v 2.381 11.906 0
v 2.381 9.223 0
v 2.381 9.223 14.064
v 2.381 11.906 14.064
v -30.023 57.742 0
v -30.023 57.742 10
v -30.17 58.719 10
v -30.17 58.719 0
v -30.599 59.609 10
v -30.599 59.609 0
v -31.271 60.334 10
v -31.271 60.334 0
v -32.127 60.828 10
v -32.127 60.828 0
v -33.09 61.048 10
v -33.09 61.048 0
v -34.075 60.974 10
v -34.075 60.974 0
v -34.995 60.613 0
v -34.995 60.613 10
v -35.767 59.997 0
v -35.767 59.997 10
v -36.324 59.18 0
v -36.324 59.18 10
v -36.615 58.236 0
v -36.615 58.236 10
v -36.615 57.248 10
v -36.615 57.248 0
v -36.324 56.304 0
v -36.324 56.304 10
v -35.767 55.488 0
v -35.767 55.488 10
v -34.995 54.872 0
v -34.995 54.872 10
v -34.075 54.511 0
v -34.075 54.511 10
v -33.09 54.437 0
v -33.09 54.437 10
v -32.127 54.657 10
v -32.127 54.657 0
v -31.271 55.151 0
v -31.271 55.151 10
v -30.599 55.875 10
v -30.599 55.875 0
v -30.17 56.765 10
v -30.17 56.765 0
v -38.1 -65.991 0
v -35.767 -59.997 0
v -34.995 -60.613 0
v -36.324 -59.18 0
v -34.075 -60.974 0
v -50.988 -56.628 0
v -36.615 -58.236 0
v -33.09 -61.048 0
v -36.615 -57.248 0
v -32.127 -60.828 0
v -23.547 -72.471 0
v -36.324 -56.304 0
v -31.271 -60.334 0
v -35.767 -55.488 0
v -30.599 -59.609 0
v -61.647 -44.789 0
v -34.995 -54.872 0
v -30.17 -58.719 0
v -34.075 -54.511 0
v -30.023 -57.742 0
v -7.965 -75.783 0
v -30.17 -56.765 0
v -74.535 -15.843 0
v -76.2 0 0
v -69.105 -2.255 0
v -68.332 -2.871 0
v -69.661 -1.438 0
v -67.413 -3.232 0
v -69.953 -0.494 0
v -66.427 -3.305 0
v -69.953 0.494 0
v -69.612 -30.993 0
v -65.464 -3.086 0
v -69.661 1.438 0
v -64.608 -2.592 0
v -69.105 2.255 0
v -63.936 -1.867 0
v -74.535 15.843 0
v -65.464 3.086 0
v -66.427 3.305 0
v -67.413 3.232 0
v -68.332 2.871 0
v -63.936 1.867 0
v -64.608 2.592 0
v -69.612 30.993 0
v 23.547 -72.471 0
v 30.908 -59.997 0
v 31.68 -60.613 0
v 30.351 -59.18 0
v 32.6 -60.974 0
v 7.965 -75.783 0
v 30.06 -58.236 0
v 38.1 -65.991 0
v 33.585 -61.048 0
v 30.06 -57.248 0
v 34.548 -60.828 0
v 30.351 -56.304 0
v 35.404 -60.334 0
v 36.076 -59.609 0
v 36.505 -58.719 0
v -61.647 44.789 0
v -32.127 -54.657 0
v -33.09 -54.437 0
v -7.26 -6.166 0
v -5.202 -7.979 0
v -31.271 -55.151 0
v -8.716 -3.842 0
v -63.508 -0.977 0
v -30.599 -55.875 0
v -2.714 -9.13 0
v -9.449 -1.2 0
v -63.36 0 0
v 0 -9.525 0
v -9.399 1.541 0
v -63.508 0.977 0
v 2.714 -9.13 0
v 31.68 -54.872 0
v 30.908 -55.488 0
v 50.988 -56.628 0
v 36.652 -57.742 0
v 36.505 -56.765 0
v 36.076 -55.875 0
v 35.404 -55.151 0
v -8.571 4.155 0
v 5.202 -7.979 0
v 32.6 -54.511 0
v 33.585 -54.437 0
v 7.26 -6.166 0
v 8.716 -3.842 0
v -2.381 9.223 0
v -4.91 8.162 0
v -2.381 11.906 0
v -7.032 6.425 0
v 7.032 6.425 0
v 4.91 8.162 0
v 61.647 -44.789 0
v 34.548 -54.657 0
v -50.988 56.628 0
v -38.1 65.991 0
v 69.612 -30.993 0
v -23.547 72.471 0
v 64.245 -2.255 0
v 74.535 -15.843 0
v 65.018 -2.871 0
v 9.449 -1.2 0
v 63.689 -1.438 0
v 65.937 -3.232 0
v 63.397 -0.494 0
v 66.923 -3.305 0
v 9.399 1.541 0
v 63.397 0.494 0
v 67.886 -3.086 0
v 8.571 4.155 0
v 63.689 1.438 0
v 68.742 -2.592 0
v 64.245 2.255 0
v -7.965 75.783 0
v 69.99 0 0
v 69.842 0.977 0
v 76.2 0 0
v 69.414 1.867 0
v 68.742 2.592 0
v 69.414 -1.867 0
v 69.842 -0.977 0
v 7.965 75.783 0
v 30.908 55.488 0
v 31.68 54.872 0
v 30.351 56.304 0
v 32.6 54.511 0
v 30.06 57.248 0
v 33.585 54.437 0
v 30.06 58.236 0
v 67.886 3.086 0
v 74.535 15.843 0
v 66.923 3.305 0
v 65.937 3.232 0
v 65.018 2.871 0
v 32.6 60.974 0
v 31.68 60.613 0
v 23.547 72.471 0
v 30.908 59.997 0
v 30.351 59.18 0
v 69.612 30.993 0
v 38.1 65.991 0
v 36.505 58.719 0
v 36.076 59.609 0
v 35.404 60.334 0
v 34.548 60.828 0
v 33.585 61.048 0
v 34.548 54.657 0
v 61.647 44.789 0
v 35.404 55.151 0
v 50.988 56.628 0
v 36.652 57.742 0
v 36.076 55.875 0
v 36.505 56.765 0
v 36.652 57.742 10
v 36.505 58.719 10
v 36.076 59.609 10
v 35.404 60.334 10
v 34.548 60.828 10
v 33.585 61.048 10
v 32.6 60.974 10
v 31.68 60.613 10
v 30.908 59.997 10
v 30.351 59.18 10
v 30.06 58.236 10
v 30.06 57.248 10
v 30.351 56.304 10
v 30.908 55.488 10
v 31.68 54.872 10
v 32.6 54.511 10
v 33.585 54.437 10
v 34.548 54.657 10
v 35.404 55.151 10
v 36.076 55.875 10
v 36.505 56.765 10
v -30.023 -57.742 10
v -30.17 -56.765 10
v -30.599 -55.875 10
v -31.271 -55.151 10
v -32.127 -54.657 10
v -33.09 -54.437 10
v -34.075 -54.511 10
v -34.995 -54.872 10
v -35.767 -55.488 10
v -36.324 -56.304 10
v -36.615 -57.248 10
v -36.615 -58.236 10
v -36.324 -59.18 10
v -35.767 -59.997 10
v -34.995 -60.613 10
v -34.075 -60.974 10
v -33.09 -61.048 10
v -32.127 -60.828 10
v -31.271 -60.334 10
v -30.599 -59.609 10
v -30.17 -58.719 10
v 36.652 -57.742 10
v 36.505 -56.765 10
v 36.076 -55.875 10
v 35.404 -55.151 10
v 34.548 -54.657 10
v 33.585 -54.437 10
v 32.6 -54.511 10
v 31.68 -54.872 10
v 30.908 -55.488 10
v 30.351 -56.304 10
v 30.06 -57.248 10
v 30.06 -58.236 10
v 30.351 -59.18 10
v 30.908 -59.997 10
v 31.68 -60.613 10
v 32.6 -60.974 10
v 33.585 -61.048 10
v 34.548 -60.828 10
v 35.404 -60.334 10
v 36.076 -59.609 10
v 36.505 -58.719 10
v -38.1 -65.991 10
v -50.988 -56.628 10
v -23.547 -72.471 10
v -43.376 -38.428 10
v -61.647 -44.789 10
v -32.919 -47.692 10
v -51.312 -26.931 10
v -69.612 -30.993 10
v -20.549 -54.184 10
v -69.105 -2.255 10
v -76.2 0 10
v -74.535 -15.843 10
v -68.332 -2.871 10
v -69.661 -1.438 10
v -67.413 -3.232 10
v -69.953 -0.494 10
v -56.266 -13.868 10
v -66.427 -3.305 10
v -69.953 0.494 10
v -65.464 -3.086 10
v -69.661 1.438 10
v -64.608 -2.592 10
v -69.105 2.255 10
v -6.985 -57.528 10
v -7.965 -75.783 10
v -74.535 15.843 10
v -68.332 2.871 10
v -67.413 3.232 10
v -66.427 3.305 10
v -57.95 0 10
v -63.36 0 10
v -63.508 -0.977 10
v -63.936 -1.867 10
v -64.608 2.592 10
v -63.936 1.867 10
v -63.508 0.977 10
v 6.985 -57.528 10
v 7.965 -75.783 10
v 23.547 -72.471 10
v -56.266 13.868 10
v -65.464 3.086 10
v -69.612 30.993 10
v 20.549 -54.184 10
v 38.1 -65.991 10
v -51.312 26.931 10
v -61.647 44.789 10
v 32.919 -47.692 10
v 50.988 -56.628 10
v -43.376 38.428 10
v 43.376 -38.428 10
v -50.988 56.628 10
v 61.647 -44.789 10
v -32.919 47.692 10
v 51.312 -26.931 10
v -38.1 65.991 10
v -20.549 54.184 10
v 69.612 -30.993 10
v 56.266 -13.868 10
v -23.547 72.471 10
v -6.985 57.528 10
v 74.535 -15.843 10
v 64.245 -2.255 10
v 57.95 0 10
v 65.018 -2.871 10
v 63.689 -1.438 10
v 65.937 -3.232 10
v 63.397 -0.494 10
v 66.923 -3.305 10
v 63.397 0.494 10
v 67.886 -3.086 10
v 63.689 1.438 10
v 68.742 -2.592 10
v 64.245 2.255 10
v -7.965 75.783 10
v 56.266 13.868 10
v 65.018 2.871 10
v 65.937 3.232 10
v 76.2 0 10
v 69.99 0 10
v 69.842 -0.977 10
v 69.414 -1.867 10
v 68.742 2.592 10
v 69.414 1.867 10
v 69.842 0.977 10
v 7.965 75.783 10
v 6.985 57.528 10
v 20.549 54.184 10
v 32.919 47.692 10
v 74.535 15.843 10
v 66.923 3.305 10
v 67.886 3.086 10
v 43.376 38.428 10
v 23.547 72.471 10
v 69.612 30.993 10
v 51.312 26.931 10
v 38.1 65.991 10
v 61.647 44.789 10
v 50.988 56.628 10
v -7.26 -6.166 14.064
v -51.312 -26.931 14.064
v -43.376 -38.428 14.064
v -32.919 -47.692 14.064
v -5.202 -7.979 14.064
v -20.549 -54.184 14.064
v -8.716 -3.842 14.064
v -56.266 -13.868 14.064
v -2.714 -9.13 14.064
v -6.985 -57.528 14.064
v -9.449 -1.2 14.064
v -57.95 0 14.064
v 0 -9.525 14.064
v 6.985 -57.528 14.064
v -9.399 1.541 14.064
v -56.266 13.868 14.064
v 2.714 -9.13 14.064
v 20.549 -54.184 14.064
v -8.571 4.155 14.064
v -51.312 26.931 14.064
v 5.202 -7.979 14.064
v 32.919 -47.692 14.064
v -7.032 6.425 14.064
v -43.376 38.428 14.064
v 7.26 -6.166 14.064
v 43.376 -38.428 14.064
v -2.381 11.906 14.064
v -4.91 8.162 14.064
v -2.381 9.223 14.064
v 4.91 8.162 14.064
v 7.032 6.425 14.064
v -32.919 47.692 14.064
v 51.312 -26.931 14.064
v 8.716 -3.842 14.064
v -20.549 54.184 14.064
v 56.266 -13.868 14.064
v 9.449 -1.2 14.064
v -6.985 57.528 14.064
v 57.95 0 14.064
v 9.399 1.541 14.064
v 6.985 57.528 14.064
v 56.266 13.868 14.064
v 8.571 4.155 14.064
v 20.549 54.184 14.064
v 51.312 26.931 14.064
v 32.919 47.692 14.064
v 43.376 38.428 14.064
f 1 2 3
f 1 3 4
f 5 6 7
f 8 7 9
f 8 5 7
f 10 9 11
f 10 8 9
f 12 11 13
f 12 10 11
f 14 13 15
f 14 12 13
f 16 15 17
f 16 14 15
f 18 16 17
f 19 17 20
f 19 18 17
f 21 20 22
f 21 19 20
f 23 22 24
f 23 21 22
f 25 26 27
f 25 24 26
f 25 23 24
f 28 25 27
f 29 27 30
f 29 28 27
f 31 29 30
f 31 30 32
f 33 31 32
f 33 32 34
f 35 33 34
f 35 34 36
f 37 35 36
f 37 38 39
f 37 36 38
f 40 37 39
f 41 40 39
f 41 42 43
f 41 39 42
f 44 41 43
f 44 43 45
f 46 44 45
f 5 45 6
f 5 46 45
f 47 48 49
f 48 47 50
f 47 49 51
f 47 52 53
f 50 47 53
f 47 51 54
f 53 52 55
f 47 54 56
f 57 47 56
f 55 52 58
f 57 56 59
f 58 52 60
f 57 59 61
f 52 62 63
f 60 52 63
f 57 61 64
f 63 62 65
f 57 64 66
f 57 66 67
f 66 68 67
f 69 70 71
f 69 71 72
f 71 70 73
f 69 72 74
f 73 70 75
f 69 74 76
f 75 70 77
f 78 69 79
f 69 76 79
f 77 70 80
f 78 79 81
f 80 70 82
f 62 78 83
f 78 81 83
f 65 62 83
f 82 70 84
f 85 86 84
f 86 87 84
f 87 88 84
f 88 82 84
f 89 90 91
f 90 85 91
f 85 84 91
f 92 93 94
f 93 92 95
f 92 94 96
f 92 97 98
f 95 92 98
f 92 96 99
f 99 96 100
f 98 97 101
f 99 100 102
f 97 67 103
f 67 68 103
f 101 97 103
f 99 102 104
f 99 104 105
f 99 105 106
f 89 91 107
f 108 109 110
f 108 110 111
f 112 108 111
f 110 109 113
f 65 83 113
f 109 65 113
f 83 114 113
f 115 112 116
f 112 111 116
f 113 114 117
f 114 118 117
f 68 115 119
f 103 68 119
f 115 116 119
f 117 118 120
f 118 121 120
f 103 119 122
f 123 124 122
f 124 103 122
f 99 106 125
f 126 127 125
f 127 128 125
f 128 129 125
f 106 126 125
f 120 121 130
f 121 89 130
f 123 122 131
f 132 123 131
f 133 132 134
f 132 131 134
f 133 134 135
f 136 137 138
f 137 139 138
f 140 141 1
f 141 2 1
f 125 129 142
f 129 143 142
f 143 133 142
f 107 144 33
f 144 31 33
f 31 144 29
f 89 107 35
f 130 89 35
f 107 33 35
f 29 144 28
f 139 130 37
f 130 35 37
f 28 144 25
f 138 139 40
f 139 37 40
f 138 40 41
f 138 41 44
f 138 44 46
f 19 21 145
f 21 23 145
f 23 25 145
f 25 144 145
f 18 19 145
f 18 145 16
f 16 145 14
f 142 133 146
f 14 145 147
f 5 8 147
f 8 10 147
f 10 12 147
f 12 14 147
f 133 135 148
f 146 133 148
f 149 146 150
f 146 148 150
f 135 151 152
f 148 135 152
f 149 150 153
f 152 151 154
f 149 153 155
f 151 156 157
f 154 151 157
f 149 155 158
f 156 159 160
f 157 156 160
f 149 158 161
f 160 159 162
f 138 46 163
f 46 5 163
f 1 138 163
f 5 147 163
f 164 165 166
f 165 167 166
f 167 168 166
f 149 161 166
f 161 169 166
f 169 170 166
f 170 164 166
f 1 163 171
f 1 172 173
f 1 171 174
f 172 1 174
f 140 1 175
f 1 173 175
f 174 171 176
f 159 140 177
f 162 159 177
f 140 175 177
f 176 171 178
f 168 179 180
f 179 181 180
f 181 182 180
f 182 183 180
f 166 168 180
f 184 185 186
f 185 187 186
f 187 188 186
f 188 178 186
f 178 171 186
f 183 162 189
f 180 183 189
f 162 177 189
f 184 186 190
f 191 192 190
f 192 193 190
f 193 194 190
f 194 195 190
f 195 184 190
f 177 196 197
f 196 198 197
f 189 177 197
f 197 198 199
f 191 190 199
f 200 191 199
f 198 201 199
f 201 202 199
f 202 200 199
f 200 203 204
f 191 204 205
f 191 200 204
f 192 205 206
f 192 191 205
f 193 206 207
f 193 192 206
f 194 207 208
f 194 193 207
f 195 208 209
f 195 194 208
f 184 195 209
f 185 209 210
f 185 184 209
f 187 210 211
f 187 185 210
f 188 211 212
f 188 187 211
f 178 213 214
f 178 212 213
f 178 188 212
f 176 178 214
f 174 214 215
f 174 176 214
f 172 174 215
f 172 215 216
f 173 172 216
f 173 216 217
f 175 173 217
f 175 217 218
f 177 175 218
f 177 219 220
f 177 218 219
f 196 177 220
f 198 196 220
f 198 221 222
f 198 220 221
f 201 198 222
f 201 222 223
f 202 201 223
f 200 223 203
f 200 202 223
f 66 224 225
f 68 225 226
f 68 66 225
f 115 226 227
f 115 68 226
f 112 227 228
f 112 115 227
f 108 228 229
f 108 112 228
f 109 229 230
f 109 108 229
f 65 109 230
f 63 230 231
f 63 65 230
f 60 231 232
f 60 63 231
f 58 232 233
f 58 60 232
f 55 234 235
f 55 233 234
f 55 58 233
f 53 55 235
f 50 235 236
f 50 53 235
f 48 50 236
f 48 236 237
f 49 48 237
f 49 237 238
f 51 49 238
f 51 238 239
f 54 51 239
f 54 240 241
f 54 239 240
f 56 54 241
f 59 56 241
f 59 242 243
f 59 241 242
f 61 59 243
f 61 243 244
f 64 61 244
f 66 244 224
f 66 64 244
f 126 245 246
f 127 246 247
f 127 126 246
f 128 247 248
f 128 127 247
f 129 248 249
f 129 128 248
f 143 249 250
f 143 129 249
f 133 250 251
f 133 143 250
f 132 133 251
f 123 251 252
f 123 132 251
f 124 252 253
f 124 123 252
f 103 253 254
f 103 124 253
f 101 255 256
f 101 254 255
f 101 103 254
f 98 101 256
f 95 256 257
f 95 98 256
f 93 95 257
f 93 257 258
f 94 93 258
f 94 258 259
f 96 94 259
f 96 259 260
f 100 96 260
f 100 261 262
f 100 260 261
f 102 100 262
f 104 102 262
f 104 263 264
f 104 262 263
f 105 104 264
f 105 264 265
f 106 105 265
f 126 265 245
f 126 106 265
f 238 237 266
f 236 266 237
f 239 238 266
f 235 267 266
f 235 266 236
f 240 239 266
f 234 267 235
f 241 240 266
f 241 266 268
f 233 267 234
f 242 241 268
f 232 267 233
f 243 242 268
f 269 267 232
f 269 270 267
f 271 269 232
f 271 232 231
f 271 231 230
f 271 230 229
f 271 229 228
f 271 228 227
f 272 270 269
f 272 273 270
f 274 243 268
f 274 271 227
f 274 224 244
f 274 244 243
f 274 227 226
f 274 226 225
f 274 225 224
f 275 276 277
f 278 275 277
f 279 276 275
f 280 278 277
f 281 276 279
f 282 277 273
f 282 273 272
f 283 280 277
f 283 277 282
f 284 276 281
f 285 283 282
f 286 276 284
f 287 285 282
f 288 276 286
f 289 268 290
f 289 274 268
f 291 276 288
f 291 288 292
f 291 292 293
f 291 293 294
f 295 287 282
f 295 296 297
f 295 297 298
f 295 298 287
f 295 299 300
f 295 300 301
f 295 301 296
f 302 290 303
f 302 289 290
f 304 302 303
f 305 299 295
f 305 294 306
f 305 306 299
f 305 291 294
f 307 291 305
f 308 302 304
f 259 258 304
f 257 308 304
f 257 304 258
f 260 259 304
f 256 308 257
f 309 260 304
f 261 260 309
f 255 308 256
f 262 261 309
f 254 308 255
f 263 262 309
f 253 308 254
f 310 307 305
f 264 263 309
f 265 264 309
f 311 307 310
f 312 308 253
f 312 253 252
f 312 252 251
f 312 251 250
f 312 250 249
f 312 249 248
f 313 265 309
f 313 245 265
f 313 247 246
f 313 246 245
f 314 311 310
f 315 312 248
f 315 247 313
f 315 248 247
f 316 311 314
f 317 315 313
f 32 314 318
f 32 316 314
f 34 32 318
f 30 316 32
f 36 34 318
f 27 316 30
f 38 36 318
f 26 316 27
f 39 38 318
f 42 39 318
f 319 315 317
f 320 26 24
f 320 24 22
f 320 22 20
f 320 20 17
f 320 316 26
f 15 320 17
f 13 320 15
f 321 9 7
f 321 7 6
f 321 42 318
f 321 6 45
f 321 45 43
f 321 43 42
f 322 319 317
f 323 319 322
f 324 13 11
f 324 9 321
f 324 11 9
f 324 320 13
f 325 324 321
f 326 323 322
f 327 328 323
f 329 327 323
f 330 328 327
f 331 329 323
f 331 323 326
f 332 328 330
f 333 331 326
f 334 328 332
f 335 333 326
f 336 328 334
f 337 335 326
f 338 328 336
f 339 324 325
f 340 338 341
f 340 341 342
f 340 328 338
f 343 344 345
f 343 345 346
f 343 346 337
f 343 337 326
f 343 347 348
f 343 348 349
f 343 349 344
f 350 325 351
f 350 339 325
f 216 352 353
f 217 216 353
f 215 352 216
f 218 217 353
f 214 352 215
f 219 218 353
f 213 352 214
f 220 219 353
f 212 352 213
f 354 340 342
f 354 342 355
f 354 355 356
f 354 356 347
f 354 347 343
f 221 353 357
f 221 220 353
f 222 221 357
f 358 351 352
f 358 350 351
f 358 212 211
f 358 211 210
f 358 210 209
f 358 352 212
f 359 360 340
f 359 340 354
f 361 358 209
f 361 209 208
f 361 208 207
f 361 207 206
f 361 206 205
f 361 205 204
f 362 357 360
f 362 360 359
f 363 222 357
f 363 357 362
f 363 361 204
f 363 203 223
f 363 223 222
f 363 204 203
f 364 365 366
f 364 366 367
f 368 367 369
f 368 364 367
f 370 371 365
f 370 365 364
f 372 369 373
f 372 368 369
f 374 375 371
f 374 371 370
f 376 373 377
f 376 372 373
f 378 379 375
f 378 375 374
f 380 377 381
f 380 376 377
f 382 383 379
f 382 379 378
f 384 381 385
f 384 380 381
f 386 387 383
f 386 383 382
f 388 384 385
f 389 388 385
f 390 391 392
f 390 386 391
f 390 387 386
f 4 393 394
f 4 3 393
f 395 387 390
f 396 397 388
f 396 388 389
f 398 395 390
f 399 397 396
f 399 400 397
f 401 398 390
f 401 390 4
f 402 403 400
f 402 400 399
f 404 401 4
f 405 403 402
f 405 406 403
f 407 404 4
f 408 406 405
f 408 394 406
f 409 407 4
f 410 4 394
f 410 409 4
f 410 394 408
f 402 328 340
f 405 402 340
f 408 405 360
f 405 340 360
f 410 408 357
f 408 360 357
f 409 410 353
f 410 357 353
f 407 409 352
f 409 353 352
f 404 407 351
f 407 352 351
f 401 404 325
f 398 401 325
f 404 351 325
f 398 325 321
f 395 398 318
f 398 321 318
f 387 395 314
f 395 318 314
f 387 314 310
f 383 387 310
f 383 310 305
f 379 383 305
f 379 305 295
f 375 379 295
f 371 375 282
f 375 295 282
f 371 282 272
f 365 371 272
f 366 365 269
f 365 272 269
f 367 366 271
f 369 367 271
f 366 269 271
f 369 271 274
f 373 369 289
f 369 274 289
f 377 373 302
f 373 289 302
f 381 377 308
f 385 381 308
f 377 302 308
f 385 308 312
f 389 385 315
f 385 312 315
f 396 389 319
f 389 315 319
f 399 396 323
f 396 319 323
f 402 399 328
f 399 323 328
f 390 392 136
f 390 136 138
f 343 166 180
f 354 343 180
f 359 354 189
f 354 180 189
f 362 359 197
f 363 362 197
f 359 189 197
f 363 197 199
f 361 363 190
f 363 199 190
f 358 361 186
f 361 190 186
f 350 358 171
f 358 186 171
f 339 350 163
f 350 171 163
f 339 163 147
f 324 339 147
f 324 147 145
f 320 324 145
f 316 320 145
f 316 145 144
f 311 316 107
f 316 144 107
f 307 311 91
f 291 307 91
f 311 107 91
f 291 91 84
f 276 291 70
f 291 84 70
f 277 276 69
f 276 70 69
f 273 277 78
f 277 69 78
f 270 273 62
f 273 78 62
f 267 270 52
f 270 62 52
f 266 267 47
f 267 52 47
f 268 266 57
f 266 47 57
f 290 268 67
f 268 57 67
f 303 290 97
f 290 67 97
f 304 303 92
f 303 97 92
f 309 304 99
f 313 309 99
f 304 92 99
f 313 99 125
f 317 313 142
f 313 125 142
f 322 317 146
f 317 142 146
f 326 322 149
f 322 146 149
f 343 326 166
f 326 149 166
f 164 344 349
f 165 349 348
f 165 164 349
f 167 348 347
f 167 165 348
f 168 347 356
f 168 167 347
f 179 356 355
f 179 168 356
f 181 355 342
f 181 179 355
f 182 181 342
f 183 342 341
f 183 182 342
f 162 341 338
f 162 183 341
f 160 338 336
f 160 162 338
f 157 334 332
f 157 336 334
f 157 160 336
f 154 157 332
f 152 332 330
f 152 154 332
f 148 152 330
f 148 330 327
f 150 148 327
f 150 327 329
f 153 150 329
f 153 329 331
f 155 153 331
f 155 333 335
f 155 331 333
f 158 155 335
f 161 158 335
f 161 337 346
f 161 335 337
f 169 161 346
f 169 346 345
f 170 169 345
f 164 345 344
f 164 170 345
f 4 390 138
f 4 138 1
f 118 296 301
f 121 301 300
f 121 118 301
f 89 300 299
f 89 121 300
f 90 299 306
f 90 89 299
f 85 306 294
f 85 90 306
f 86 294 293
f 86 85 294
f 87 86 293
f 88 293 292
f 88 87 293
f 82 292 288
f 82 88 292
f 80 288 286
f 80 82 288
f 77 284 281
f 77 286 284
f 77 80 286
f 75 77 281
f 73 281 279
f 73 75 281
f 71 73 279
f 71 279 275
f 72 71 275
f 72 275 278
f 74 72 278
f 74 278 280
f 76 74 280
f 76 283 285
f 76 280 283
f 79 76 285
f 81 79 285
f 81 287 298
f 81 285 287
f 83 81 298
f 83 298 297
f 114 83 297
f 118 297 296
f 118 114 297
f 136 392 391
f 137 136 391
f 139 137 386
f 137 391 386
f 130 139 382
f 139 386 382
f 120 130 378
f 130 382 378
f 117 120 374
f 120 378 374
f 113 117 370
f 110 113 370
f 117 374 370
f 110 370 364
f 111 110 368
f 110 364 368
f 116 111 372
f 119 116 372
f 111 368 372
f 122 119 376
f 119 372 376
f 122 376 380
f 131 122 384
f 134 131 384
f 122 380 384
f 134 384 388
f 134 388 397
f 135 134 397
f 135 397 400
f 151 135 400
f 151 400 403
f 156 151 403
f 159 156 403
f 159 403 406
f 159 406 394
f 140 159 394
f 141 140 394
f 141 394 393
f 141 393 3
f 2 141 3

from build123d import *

# Parameters (mm, degrees)
SKETCH1_R           = 76.2
BOSS_EXTRUDE1_DEPTH = 10
SKETCH2_R           = 3.3147
CUT_EXTRUDE2_DEPTH  = 109.226059708
SKETCH4_R           = 57.9501
BOSS_EXTRUDE2_DEPTH = 4.064
SKETCH6_R           = 9.525
SKETCH6_W           = 4.7625
SKETCH6_H           = 4.7625
CUT_EXTRUDE3_DEPTH  = 109.676934517


with BuildPart() as part:
    # Sketch1 → Boss-Extrude1 (new body)
    with BuildSketch(Plane.XY):
        Circle(SKETCH1_R)
    extrude(amount=BOSS_EXTRUDE1_DEPTH)

    # Sketch2 → Cut-Extrude2 (cut, through all)
    with BuildSketch(Plane.XY):
        with Locations((66.675, 0)):
            Circle(SKETCH2_R)
        with Locations((33.3375, -57.742243797)):
            Circle(SKETCH2_R)
        with Locations((-33.3375, -57.742243797)):
            Circle(SKETCH2_R)
        with Locations((-66.675, 0)):
            Circle(SKETCH2_R)
        with Locations((-33.3375, 57.742243797)):
            Circle(SKETCH2_R)
        with Locations((33.3375, 57.742243797)):
            Circle(SKETCH2_R)
    extrude(amount=CUT_EXTRUDE2_DEPTH, mode=Mode.SUBTRACT)

    # Sketch4 → Boss-Extrude2 (add)
    with BuildSketch(Plane.XY.offset(10)):
        Circle(SKETCH4_R)
    extrude(amount=BOSS_EXTRUDE2_DEPTH)

    # Sketch6 → Cut-Extrude3 (cut, through all)
    with BuildSketch(Plane.XY.offset(14.064)):
        Circle(SKETCH6_R)
        with Locations((0, 9.525)):
            Rectangle(SKETCH6_W, SKETCH6_H)
    extrude(amount=-CUT_EXTRUDE3_DEPTH, mode=Mode.SUBTRACT)


solid = part.part
